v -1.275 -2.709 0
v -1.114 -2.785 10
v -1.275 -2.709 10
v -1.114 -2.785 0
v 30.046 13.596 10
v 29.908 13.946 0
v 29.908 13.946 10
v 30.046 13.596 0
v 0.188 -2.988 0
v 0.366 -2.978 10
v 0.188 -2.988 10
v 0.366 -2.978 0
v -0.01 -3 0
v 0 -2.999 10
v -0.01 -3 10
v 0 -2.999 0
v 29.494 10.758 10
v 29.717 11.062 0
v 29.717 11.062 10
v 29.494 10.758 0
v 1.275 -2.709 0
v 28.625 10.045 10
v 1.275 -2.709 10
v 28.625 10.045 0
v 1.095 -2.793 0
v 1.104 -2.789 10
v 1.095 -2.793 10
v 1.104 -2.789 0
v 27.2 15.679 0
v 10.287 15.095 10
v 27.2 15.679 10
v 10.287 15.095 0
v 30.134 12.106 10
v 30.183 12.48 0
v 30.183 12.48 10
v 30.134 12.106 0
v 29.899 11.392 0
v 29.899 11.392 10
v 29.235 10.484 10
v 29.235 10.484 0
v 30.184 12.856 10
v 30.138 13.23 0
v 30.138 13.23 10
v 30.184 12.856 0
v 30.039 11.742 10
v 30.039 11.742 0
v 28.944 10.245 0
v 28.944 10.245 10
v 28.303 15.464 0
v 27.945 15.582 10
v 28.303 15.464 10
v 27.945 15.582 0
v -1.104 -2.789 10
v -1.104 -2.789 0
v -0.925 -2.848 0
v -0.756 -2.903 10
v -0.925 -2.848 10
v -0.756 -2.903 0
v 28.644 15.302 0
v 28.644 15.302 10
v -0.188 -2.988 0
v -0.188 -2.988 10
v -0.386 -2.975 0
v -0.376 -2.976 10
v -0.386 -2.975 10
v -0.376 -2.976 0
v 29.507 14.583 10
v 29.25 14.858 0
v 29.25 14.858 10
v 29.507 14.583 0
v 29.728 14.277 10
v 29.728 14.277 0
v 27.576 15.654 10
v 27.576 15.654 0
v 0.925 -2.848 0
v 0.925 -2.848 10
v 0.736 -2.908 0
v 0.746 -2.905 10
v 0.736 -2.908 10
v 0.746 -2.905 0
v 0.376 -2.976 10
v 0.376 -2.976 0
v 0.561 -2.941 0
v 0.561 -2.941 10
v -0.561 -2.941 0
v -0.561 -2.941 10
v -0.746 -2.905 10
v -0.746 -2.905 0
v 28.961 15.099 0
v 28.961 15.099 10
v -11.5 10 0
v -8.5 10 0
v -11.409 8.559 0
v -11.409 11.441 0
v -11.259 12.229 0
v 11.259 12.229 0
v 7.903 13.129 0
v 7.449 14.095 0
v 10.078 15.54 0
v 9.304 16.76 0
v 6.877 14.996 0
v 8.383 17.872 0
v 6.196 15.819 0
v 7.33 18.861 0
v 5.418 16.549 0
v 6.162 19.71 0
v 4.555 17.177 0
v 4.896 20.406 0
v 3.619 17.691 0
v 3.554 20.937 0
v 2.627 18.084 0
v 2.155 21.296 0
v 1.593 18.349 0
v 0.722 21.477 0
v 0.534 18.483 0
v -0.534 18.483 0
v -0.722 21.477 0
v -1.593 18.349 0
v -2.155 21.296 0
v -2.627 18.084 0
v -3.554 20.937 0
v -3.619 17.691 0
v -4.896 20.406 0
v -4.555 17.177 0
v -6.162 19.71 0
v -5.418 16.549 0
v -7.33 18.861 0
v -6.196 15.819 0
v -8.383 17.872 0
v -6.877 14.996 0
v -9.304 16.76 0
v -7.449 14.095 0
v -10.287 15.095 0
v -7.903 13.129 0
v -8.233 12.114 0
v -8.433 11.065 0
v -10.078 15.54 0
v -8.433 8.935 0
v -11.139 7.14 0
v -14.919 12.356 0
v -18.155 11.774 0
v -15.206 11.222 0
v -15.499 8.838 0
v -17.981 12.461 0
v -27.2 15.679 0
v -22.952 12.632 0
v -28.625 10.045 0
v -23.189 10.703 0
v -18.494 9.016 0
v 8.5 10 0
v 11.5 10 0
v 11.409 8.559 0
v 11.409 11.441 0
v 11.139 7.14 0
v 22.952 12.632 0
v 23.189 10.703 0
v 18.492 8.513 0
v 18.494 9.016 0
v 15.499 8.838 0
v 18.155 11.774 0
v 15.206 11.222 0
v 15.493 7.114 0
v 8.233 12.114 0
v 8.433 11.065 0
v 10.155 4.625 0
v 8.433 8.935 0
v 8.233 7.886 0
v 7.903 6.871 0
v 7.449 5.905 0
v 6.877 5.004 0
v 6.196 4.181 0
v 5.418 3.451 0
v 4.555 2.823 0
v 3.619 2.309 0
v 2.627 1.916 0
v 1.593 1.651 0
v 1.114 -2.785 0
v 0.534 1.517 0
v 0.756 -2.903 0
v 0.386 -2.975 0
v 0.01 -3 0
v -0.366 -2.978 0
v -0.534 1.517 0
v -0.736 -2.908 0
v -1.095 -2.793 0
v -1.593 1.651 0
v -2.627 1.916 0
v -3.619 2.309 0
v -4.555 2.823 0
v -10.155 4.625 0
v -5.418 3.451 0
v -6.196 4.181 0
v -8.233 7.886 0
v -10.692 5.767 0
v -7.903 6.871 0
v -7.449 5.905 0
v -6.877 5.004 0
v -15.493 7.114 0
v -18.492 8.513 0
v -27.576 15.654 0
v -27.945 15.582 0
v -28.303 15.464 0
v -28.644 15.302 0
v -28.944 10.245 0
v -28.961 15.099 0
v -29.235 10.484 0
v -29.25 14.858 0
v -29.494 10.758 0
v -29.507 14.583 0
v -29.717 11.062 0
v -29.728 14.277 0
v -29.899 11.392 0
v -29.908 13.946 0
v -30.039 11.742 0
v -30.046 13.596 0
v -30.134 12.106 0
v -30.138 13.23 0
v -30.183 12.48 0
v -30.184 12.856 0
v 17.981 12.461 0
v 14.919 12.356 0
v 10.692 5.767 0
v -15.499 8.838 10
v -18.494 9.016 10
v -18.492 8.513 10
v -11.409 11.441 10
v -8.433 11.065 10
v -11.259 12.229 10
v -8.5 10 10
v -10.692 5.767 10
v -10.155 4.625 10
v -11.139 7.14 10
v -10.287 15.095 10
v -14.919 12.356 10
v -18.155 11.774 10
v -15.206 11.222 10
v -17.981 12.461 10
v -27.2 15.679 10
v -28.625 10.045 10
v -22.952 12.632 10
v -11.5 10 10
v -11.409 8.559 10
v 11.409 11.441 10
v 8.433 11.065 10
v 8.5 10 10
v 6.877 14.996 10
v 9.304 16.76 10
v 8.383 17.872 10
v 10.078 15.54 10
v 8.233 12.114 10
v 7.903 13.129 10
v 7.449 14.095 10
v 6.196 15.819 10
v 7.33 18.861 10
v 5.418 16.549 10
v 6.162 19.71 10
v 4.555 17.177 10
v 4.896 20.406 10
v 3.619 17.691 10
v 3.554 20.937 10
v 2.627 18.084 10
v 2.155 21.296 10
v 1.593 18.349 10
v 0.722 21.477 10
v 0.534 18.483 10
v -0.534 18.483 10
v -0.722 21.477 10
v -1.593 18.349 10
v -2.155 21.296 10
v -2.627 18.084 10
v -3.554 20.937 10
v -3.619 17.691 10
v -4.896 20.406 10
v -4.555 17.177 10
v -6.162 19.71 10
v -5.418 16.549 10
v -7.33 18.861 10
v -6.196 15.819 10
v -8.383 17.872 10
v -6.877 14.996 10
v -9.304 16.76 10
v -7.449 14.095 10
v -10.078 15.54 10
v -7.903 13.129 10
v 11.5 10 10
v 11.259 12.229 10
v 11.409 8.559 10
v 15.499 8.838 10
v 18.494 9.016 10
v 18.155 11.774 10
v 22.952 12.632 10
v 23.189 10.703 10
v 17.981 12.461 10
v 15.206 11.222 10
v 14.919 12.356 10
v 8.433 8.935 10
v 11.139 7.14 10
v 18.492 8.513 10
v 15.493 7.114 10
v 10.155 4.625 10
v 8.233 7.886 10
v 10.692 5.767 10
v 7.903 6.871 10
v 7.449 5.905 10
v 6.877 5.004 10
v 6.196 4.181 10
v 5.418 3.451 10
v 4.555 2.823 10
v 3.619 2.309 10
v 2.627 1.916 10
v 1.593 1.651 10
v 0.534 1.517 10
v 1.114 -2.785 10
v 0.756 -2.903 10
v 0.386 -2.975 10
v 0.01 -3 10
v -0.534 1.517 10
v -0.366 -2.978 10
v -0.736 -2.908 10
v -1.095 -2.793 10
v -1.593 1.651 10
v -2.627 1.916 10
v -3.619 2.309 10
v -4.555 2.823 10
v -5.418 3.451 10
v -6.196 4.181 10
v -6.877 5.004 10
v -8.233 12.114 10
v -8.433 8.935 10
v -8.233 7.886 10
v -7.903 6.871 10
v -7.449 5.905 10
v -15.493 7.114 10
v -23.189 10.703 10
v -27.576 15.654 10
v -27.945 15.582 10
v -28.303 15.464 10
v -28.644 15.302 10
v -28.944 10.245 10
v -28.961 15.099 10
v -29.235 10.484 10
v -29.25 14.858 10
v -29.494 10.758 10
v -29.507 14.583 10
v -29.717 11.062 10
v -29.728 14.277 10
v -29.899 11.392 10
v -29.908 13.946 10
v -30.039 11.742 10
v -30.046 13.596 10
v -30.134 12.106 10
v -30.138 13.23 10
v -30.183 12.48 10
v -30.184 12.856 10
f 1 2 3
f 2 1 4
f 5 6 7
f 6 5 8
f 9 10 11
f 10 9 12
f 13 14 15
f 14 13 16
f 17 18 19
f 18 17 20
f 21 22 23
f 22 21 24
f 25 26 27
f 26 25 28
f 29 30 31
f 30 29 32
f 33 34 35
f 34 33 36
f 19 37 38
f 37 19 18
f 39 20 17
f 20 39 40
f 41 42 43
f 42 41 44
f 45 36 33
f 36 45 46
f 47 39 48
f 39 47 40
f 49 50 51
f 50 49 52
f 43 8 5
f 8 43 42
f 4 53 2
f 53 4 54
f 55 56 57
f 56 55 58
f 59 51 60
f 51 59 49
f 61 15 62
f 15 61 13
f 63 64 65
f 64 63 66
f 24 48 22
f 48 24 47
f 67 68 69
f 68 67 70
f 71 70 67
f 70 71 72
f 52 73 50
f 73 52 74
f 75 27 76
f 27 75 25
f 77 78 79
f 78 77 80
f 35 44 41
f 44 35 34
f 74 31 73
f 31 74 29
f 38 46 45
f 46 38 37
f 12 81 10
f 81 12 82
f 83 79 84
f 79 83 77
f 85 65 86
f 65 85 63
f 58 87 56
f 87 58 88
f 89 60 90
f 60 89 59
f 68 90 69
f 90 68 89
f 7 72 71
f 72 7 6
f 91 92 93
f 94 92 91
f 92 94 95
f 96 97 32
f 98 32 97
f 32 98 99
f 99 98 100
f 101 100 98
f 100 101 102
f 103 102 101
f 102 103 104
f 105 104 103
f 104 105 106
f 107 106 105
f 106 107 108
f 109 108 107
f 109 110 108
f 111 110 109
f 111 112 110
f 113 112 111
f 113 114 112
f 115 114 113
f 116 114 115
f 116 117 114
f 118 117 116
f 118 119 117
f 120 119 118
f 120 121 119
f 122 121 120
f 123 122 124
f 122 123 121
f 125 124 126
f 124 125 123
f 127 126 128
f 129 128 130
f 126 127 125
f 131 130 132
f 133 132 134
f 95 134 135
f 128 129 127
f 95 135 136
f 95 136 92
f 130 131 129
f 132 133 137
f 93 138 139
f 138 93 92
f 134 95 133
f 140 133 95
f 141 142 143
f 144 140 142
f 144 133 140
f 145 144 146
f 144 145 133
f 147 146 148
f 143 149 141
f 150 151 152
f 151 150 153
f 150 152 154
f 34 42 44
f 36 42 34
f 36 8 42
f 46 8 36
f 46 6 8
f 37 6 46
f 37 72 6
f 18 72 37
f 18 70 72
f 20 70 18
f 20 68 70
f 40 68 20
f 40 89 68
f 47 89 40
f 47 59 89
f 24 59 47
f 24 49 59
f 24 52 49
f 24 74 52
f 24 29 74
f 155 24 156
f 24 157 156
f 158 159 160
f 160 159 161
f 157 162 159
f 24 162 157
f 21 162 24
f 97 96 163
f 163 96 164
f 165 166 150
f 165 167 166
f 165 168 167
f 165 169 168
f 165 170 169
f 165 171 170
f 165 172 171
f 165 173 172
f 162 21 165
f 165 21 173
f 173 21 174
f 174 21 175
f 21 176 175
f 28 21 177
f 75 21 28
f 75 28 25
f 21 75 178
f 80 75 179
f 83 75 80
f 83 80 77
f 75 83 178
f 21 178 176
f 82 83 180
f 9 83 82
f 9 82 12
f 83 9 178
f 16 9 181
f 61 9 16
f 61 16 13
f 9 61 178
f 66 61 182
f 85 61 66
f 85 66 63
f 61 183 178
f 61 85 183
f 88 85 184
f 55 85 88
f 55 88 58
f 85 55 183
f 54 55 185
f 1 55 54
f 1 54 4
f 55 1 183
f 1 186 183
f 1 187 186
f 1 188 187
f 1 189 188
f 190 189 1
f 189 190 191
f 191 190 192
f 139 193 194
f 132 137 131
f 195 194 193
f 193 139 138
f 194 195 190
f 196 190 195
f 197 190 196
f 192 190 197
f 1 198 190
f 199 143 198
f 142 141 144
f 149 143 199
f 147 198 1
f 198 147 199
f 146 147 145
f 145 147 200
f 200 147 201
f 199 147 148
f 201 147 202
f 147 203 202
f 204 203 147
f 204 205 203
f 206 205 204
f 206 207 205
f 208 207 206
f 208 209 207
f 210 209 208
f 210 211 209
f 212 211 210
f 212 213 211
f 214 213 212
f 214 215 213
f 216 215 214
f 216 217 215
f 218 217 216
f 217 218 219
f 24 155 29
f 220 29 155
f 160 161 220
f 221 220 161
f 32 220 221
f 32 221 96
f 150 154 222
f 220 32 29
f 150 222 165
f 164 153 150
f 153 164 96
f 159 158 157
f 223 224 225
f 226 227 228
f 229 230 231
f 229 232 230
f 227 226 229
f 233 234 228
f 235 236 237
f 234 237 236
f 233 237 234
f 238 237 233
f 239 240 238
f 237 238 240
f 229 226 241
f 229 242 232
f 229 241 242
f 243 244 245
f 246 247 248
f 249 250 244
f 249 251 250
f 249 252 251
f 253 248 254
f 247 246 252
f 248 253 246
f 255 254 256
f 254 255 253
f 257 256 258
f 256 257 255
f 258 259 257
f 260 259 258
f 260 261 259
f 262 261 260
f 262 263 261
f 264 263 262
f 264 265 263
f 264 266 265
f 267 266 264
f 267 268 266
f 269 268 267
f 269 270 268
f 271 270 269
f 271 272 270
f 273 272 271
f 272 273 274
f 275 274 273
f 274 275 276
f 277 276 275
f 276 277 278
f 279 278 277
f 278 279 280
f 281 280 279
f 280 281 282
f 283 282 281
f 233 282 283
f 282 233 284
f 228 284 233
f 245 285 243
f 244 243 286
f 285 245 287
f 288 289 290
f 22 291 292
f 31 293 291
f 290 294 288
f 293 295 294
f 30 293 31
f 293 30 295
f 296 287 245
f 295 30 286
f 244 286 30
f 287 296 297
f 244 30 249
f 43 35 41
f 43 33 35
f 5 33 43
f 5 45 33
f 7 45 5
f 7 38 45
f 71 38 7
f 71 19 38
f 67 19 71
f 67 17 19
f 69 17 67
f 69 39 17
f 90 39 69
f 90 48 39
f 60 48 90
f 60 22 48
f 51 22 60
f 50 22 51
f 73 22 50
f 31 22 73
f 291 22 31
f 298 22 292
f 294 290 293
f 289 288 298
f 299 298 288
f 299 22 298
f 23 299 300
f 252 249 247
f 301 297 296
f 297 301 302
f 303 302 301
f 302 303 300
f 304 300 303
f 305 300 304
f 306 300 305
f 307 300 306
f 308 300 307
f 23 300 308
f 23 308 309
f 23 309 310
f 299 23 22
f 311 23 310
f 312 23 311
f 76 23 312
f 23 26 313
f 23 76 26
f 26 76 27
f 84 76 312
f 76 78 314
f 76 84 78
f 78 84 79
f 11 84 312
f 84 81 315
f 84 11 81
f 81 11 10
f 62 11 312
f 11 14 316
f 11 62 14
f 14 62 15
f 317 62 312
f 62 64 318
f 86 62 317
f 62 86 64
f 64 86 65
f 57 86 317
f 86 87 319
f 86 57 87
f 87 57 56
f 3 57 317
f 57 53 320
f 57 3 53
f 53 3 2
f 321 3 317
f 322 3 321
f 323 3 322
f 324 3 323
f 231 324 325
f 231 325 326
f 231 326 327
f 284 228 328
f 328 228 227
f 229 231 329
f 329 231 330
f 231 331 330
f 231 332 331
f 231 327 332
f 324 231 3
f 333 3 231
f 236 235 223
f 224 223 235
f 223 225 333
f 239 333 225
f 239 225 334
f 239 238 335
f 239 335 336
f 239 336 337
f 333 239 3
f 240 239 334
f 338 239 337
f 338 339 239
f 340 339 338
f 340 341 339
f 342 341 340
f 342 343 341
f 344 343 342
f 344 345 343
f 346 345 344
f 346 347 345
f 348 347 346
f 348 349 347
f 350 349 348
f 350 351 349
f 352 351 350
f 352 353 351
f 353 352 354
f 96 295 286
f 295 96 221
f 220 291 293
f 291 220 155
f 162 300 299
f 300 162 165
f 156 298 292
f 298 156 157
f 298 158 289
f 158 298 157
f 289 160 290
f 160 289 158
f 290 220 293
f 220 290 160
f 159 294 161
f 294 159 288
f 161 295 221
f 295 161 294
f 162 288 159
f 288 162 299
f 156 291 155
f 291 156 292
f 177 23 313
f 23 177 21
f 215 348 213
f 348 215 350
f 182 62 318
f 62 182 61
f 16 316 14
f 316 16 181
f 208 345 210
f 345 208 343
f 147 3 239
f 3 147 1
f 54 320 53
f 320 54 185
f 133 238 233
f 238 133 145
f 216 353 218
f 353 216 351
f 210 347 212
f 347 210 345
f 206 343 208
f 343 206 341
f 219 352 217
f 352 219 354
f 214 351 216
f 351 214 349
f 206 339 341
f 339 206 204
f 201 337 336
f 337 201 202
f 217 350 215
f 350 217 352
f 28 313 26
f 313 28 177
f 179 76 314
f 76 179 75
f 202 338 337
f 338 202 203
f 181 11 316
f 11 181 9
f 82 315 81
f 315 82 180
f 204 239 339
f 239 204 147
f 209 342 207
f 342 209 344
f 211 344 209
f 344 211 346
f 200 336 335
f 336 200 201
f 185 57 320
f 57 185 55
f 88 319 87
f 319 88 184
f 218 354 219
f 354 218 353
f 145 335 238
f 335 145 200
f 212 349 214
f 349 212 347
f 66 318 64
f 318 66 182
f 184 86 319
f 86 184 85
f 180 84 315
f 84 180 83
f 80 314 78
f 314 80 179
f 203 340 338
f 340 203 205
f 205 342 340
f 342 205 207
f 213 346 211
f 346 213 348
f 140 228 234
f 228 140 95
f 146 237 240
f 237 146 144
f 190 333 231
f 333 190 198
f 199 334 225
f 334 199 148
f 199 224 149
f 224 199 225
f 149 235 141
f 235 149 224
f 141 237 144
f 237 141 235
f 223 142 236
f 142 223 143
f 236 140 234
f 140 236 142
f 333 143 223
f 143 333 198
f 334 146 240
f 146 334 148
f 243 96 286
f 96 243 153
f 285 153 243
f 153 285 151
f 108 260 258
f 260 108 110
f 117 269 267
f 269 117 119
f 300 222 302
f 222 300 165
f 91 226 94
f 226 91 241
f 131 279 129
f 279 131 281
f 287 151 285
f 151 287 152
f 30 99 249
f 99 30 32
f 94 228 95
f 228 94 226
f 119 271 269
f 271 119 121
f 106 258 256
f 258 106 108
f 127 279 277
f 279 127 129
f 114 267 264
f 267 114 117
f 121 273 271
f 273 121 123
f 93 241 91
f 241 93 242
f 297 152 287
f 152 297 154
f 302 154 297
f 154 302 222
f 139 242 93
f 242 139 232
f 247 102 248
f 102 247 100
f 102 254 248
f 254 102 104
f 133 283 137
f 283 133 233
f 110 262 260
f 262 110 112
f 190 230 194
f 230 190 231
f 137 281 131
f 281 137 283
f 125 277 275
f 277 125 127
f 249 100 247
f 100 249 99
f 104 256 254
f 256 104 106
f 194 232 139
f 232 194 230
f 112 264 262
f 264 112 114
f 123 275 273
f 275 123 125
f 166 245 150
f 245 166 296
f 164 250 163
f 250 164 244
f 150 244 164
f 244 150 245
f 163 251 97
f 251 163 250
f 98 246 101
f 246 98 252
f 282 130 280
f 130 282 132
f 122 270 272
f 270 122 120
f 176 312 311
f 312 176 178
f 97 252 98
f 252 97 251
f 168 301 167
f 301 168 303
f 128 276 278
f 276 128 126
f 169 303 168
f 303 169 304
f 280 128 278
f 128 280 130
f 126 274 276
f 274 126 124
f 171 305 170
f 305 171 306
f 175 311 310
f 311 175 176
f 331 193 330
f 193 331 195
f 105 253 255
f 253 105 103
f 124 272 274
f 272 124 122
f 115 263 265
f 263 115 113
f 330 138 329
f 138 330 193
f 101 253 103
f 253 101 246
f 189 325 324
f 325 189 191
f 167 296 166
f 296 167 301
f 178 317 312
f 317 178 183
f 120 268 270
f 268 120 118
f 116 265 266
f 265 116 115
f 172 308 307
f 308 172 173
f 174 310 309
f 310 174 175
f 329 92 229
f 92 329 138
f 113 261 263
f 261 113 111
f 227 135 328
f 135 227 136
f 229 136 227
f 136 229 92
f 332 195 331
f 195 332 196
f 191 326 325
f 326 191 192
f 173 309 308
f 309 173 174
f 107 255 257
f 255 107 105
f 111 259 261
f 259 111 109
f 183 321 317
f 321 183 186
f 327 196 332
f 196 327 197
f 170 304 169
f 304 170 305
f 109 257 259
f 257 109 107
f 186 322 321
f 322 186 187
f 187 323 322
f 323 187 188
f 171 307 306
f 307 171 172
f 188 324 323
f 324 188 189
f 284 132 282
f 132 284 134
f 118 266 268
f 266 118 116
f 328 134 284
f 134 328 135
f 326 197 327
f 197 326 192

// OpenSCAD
/* [Book Ring] */

// Diameter of central thumb hole.
thumb_hole_diameter = 17;

// Displacement of thumb hole above corner.
thumb_hole_offset = 0;	 			

wall_thickness = 3;

height = 10;

// Wing span from center to tip.
wing_length = 30;

// Angle of wings. Smaller angles hold the pages flatter.
angle = 25;

/* [Hidden] */

thumb_radius = thumb_hole_diameter / 2;
$fn = 50;

bookring(thumb_radius, wall_thickness, height);


module bookring(thumb_radius, wall, height) {
	difference() {
		union() {

			// Thumb hole stock
			translate([0, (thumb_radius + (wall / 2)) + thumb_hole_offset, 0])
				cylinder(r = (thumb_radius + wall), h = height);
			
			// Right wing
			rotate([0, 0, angle])
				union() {
					wing(wall);
					spar((thumb_radius * 2.25), ((thumb_radius * 2.25) + wall), wall);
					spar((wing_length - wall), (wing_length * 2), wall);
				}

			// Left wing
			rotate([0, 0, (-angle)])
				mirror([1, 0, 0]) {
					wing(wall);
					spar((thumb_radius * 2.25), ((thumb_radius * 2.25) + wall), wall);
					spar((wing_length - wall), (wing_length * 2), wall);
				}
		}
		
		// Thumb hole
		translate([0, (thumb_radius + (wall / 2)) +thumb_hole_offset, -0.5])
			cylinder(r = thumb_radius, h = height+1);
	}
}


module wing(wall) {
	difference() {
		
		// Exterior perimeter of wing (rounded triangle)
		hull() {
			cylinder(r = wall, h = height);

			translate([wing_length, 0, 0])
				cylinder(r = wall, h = height);

			translate([0, (thumb_radius * 1.5), 0])
				cylinder(r = wall, h = height);
		}

		// Interior perimeter (cutout)
		hull() {
			translate([0, 0, -0.5])
				cylinder(r = 0.1, h = height+1);

			translate([wing_length, 0, -0.5])
				cylinder(r = 0.1, h = height+1);

			translate([0, (thumb_radius * 1.5), -0.5])
				cylinder(r = 0.1, h = height+1);
		}
	}
}

module spar(innerradius, outerradius, wall) {
	intersection() {
		hull() {
			cylinder(r = wall, h = height);
			translate([wing_length, 0, 0])
				cylinder(r = wall, h = height);
			translate([0, (thumb_radius * 1.5), 0])
				cylinder(r = wall, h = height);
		}
		difference() {
			translate([0, thumb_radius, 0])
				cylinder(r = outerradius, h = height);
			translate([0, thumb_radius, -0.5])
				cylinder(r = innerradius, h = height+1);
		}
	}
}
